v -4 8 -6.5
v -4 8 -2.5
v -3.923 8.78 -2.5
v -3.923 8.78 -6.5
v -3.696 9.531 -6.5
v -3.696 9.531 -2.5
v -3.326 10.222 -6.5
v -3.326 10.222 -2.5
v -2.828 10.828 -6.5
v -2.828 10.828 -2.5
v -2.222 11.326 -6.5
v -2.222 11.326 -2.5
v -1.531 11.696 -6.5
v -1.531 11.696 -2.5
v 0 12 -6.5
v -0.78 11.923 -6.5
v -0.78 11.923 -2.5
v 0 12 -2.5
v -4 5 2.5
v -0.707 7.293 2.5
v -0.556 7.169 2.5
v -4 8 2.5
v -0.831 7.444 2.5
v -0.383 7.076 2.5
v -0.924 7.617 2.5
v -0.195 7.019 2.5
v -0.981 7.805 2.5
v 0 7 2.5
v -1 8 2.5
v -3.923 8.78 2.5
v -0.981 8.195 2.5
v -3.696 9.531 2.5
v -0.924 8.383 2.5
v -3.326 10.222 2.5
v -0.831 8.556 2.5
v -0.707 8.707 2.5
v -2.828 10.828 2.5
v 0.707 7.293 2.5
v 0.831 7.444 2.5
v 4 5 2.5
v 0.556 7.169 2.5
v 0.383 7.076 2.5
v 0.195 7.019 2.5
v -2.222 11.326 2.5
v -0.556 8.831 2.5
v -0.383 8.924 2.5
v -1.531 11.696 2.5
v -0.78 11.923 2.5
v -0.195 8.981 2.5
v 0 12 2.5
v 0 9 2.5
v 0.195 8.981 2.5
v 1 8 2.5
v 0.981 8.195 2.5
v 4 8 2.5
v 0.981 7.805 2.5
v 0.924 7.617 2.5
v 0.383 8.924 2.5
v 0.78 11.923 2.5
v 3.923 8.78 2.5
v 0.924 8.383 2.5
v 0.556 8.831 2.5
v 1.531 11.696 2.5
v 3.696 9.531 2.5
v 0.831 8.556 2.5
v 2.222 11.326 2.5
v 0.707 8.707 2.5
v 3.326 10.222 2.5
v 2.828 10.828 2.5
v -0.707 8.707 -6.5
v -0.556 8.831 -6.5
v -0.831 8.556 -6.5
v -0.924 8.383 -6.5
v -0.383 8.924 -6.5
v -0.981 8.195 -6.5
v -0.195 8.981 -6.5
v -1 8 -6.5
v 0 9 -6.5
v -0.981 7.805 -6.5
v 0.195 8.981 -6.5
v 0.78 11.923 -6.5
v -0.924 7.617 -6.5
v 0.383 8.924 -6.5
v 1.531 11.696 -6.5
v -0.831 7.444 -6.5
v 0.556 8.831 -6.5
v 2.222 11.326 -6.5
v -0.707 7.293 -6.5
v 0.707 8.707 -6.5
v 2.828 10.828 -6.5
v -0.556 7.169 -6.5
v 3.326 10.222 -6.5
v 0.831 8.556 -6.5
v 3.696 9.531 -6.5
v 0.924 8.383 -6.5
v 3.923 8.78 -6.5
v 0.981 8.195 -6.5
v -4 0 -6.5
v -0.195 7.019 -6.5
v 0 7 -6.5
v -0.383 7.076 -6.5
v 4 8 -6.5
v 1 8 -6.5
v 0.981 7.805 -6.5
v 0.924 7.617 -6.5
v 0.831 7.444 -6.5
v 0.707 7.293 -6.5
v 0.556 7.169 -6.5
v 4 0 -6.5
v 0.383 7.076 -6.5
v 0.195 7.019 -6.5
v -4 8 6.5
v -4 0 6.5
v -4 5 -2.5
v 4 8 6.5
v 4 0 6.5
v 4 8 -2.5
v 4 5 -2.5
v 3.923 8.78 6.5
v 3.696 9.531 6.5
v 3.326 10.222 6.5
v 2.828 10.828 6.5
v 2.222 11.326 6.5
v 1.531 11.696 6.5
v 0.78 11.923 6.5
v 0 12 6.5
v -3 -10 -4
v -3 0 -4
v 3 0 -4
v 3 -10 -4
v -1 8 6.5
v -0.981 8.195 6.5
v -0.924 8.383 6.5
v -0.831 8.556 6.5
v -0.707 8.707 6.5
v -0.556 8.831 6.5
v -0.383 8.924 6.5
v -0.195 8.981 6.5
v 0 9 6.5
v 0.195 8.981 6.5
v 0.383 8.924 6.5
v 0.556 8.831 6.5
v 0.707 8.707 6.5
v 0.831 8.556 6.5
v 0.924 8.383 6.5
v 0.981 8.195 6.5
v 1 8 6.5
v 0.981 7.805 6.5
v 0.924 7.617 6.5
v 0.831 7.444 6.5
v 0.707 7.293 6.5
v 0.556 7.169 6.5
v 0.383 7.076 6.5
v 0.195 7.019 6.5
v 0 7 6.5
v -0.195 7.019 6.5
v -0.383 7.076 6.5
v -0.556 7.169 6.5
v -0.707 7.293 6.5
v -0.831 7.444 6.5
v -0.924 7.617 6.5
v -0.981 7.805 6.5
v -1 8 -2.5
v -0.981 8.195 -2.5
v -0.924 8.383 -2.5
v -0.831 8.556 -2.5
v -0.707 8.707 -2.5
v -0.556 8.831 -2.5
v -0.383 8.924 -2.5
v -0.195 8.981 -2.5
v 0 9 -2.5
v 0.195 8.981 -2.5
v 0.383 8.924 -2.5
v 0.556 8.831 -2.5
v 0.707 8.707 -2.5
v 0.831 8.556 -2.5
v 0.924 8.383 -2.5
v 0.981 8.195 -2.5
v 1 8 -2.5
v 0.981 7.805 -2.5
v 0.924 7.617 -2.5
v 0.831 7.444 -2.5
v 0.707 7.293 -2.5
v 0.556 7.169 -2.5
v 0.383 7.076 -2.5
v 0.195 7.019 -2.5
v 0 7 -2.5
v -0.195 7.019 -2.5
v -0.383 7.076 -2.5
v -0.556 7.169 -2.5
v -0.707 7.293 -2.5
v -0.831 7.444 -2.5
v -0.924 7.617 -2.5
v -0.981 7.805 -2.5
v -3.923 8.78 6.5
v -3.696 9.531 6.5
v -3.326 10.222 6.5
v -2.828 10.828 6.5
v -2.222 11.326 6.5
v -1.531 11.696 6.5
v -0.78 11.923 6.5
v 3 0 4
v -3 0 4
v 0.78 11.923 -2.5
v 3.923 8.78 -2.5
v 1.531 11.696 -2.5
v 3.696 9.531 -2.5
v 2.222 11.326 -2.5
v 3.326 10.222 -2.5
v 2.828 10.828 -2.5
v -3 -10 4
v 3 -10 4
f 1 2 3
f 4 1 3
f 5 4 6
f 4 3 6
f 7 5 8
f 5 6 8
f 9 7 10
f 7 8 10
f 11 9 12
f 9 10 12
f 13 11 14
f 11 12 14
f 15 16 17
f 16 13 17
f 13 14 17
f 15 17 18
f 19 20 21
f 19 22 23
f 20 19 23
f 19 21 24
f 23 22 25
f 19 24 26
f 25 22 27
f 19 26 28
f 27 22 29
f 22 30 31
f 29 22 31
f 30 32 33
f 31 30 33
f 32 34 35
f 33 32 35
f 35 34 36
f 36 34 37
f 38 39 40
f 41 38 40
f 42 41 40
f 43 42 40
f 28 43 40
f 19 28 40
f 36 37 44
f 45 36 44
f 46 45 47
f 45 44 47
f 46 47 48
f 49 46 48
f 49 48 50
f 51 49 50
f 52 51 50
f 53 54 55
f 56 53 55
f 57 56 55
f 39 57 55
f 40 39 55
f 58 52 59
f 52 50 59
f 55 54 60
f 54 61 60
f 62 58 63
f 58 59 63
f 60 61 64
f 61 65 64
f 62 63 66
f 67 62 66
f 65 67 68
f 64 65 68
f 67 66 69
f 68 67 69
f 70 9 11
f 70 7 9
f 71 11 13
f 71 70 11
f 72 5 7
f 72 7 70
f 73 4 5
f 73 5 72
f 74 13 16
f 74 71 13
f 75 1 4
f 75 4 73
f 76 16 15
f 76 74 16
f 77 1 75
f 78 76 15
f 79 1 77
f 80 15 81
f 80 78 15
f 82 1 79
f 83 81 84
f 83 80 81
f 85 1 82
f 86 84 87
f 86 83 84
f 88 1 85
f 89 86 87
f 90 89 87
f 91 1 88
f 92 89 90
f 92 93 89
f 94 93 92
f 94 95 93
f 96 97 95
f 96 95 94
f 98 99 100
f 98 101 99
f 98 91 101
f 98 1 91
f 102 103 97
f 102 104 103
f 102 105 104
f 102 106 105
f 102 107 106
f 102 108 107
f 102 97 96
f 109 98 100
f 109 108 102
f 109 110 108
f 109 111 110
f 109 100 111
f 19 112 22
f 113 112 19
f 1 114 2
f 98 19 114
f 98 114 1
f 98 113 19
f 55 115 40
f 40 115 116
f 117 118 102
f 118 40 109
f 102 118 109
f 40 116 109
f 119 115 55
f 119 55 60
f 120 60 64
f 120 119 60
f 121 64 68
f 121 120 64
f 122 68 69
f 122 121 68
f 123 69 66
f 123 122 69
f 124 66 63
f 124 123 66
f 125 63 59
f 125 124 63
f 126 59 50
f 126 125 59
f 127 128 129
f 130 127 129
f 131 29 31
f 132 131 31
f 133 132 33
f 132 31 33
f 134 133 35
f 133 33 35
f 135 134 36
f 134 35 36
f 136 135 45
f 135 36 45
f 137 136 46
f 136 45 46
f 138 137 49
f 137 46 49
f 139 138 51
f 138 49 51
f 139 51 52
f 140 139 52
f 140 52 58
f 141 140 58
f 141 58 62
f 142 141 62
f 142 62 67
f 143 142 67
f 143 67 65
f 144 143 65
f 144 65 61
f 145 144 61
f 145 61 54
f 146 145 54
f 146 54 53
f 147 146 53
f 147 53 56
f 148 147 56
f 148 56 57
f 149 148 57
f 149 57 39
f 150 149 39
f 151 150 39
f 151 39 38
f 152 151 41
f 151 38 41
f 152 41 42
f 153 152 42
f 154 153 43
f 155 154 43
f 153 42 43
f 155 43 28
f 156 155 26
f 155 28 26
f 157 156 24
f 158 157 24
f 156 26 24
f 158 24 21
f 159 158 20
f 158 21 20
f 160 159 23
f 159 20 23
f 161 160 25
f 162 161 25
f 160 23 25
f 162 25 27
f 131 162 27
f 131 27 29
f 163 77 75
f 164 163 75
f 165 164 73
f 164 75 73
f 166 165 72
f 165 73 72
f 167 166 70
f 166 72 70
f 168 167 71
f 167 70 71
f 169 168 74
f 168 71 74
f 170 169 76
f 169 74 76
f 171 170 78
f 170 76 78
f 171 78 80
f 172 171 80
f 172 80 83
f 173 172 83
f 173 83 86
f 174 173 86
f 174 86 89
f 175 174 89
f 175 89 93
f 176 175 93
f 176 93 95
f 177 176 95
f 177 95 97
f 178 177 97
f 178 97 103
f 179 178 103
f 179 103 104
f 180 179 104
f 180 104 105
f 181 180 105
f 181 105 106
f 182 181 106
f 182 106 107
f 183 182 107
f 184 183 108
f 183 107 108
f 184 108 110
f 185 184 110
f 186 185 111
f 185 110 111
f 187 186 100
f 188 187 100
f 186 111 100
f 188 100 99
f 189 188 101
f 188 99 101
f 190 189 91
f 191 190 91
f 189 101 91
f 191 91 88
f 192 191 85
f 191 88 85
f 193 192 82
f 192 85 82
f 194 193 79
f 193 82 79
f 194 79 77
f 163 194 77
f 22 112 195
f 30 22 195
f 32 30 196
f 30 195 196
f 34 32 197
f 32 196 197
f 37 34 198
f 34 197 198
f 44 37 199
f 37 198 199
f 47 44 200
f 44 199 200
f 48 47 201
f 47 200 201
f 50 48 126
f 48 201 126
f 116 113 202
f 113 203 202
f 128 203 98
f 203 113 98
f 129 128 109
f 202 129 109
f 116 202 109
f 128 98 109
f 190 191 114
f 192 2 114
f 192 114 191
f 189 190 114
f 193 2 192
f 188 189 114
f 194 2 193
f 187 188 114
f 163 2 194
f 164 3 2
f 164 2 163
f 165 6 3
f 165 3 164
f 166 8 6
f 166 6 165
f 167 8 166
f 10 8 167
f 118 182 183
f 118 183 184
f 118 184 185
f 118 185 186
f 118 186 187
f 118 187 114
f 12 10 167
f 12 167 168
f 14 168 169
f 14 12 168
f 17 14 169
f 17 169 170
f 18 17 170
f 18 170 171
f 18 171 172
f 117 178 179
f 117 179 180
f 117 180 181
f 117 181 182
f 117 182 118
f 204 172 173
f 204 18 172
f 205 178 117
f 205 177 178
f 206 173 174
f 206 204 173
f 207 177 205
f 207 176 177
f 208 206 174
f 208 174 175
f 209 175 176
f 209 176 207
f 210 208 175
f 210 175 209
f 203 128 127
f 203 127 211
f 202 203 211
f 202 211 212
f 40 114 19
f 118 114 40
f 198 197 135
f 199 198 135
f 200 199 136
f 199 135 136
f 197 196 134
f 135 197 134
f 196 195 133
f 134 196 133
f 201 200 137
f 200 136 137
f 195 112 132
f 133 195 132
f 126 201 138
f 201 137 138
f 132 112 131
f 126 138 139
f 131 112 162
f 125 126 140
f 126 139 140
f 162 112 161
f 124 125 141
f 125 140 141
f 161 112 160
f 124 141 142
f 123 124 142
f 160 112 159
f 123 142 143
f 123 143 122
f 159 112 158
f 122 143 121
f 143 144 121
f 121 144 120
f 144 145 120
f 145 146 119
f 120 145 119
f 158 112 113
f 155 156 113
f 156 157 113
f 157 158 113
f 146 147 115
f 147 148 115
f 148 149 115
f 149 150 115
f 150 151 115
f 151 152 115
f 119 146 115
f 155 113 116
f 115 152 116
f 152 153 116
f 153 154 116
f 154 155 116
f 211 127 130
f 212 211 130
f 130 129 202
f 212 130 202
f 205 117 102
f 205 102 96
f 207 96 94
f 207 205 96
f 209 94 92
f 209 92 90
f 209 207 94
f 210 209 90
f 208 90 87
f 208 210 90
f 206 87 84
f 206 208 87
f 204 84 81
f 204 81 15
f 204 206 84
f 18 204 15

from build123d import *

# Parameters (mm, degrees)
SKETCH1_W           = 8
SKETCH1_H           = 13
BOSS_EXTRUDE1_DEPTH = 12
SKETCH2_W           = 13
SKETCH2_H           = 5
CUT_EXTRUDE1_DEPTH  = 7
SKETCH3_R           = 1
CUT_EXTRUDE2_DEPTH  = 19.138357147
CUT_EXTRUDE3_START  = -13
CUT_EXTRUDE3_DEPTH  = 32.138357147
SKETCH6_W           = 6
SKETCH6_H           = 8
BOSS_EXTRUDE3_DEPTH = 10


with BuildPart() as part:
    # Sketch1 → Boss-Extrude1 (new body)
    with BuildSketch(Plane(origin=(0, 0, 0), x_dir=(1, 0, 0), z_dir=(0, 1, 0))):
        Rectangle(SKETCH1_W, SKETCH1_H)
    extrude(amount=BOSS_EXTRUDE1_DEPTH)

    # Sketch2 → Cut-Extrude1 (cut)
    with BuildSketch(Plane(origin=(0, 12, 0), x_dir=(1, 0, 0), z_dir=(0, 1, 0))):
        Rectangle(SKETCH2_W, SKETCH2_H)
    extrude(amount=-CUT_EXTRUDE1_DEPTH, mode=Mode.SUBTRACT)

    # Sketch3 → Cut-Extrude2 (cut, through all)
    with BuildSketch(Plane(origin=(0, 0, -6.5), x_dir=(-1, 0, 0), z_dir=(0, 0, -1))):
        with Locations((0, 8)):
            Circle(SKETCH3_R)
    extrude(amount=-CUT_EXTRUDE2_DEPTH, mode=Mode.SUBTRACT)

    # Sketch4 → Cut-Extrude3 (cut)
    with BuildSketch(Plane(origin=(0, 0, -6.5), x_dir=(-1, 0, 0), z_dir=(0, 0, -1)).offset(CUT_EXTRUDE3_START)):
        with BuildLine():
            Line((-4, -27.298221281), (-4, 8))
            ThreePointArc((-4, 8), (-2.828427125, 10.828427125), (0, 12))
            Line((0, 12), (35.298221281, 12))
            Line((35.298221281, 12), (-14.621001982, 61.919223264))
            Line((-14.621001982, 61.919223264), (-53.919223264, 22.621001982))
            Line((-53.919223264, 22.621001982), (-4, -27.298221281))
        make_face()
    cut_extrude3 = extrude(amount=CUT_EXTRUDE3_DEPTH, mode=Mode.SUBTRACT)

    # Mirror1: Cut-Extrude3 across plane
    add(cut_extrude3.mirror(Plane(origin=(0, 0, 0), x_dir=(0, 0, 1), z_dir=(1, 0, 0))), mode=Mode.SUBTRACT)

    # Sketch6 → Boss-Extrude3 (add)
    with BuildSketch(Plane.XZ):
        Rectangle(SKETCH6_W, SKETCH6_H)
    extrude(amount=BOSS_EXTRUDE3_DEPTH)


solid = part.part
